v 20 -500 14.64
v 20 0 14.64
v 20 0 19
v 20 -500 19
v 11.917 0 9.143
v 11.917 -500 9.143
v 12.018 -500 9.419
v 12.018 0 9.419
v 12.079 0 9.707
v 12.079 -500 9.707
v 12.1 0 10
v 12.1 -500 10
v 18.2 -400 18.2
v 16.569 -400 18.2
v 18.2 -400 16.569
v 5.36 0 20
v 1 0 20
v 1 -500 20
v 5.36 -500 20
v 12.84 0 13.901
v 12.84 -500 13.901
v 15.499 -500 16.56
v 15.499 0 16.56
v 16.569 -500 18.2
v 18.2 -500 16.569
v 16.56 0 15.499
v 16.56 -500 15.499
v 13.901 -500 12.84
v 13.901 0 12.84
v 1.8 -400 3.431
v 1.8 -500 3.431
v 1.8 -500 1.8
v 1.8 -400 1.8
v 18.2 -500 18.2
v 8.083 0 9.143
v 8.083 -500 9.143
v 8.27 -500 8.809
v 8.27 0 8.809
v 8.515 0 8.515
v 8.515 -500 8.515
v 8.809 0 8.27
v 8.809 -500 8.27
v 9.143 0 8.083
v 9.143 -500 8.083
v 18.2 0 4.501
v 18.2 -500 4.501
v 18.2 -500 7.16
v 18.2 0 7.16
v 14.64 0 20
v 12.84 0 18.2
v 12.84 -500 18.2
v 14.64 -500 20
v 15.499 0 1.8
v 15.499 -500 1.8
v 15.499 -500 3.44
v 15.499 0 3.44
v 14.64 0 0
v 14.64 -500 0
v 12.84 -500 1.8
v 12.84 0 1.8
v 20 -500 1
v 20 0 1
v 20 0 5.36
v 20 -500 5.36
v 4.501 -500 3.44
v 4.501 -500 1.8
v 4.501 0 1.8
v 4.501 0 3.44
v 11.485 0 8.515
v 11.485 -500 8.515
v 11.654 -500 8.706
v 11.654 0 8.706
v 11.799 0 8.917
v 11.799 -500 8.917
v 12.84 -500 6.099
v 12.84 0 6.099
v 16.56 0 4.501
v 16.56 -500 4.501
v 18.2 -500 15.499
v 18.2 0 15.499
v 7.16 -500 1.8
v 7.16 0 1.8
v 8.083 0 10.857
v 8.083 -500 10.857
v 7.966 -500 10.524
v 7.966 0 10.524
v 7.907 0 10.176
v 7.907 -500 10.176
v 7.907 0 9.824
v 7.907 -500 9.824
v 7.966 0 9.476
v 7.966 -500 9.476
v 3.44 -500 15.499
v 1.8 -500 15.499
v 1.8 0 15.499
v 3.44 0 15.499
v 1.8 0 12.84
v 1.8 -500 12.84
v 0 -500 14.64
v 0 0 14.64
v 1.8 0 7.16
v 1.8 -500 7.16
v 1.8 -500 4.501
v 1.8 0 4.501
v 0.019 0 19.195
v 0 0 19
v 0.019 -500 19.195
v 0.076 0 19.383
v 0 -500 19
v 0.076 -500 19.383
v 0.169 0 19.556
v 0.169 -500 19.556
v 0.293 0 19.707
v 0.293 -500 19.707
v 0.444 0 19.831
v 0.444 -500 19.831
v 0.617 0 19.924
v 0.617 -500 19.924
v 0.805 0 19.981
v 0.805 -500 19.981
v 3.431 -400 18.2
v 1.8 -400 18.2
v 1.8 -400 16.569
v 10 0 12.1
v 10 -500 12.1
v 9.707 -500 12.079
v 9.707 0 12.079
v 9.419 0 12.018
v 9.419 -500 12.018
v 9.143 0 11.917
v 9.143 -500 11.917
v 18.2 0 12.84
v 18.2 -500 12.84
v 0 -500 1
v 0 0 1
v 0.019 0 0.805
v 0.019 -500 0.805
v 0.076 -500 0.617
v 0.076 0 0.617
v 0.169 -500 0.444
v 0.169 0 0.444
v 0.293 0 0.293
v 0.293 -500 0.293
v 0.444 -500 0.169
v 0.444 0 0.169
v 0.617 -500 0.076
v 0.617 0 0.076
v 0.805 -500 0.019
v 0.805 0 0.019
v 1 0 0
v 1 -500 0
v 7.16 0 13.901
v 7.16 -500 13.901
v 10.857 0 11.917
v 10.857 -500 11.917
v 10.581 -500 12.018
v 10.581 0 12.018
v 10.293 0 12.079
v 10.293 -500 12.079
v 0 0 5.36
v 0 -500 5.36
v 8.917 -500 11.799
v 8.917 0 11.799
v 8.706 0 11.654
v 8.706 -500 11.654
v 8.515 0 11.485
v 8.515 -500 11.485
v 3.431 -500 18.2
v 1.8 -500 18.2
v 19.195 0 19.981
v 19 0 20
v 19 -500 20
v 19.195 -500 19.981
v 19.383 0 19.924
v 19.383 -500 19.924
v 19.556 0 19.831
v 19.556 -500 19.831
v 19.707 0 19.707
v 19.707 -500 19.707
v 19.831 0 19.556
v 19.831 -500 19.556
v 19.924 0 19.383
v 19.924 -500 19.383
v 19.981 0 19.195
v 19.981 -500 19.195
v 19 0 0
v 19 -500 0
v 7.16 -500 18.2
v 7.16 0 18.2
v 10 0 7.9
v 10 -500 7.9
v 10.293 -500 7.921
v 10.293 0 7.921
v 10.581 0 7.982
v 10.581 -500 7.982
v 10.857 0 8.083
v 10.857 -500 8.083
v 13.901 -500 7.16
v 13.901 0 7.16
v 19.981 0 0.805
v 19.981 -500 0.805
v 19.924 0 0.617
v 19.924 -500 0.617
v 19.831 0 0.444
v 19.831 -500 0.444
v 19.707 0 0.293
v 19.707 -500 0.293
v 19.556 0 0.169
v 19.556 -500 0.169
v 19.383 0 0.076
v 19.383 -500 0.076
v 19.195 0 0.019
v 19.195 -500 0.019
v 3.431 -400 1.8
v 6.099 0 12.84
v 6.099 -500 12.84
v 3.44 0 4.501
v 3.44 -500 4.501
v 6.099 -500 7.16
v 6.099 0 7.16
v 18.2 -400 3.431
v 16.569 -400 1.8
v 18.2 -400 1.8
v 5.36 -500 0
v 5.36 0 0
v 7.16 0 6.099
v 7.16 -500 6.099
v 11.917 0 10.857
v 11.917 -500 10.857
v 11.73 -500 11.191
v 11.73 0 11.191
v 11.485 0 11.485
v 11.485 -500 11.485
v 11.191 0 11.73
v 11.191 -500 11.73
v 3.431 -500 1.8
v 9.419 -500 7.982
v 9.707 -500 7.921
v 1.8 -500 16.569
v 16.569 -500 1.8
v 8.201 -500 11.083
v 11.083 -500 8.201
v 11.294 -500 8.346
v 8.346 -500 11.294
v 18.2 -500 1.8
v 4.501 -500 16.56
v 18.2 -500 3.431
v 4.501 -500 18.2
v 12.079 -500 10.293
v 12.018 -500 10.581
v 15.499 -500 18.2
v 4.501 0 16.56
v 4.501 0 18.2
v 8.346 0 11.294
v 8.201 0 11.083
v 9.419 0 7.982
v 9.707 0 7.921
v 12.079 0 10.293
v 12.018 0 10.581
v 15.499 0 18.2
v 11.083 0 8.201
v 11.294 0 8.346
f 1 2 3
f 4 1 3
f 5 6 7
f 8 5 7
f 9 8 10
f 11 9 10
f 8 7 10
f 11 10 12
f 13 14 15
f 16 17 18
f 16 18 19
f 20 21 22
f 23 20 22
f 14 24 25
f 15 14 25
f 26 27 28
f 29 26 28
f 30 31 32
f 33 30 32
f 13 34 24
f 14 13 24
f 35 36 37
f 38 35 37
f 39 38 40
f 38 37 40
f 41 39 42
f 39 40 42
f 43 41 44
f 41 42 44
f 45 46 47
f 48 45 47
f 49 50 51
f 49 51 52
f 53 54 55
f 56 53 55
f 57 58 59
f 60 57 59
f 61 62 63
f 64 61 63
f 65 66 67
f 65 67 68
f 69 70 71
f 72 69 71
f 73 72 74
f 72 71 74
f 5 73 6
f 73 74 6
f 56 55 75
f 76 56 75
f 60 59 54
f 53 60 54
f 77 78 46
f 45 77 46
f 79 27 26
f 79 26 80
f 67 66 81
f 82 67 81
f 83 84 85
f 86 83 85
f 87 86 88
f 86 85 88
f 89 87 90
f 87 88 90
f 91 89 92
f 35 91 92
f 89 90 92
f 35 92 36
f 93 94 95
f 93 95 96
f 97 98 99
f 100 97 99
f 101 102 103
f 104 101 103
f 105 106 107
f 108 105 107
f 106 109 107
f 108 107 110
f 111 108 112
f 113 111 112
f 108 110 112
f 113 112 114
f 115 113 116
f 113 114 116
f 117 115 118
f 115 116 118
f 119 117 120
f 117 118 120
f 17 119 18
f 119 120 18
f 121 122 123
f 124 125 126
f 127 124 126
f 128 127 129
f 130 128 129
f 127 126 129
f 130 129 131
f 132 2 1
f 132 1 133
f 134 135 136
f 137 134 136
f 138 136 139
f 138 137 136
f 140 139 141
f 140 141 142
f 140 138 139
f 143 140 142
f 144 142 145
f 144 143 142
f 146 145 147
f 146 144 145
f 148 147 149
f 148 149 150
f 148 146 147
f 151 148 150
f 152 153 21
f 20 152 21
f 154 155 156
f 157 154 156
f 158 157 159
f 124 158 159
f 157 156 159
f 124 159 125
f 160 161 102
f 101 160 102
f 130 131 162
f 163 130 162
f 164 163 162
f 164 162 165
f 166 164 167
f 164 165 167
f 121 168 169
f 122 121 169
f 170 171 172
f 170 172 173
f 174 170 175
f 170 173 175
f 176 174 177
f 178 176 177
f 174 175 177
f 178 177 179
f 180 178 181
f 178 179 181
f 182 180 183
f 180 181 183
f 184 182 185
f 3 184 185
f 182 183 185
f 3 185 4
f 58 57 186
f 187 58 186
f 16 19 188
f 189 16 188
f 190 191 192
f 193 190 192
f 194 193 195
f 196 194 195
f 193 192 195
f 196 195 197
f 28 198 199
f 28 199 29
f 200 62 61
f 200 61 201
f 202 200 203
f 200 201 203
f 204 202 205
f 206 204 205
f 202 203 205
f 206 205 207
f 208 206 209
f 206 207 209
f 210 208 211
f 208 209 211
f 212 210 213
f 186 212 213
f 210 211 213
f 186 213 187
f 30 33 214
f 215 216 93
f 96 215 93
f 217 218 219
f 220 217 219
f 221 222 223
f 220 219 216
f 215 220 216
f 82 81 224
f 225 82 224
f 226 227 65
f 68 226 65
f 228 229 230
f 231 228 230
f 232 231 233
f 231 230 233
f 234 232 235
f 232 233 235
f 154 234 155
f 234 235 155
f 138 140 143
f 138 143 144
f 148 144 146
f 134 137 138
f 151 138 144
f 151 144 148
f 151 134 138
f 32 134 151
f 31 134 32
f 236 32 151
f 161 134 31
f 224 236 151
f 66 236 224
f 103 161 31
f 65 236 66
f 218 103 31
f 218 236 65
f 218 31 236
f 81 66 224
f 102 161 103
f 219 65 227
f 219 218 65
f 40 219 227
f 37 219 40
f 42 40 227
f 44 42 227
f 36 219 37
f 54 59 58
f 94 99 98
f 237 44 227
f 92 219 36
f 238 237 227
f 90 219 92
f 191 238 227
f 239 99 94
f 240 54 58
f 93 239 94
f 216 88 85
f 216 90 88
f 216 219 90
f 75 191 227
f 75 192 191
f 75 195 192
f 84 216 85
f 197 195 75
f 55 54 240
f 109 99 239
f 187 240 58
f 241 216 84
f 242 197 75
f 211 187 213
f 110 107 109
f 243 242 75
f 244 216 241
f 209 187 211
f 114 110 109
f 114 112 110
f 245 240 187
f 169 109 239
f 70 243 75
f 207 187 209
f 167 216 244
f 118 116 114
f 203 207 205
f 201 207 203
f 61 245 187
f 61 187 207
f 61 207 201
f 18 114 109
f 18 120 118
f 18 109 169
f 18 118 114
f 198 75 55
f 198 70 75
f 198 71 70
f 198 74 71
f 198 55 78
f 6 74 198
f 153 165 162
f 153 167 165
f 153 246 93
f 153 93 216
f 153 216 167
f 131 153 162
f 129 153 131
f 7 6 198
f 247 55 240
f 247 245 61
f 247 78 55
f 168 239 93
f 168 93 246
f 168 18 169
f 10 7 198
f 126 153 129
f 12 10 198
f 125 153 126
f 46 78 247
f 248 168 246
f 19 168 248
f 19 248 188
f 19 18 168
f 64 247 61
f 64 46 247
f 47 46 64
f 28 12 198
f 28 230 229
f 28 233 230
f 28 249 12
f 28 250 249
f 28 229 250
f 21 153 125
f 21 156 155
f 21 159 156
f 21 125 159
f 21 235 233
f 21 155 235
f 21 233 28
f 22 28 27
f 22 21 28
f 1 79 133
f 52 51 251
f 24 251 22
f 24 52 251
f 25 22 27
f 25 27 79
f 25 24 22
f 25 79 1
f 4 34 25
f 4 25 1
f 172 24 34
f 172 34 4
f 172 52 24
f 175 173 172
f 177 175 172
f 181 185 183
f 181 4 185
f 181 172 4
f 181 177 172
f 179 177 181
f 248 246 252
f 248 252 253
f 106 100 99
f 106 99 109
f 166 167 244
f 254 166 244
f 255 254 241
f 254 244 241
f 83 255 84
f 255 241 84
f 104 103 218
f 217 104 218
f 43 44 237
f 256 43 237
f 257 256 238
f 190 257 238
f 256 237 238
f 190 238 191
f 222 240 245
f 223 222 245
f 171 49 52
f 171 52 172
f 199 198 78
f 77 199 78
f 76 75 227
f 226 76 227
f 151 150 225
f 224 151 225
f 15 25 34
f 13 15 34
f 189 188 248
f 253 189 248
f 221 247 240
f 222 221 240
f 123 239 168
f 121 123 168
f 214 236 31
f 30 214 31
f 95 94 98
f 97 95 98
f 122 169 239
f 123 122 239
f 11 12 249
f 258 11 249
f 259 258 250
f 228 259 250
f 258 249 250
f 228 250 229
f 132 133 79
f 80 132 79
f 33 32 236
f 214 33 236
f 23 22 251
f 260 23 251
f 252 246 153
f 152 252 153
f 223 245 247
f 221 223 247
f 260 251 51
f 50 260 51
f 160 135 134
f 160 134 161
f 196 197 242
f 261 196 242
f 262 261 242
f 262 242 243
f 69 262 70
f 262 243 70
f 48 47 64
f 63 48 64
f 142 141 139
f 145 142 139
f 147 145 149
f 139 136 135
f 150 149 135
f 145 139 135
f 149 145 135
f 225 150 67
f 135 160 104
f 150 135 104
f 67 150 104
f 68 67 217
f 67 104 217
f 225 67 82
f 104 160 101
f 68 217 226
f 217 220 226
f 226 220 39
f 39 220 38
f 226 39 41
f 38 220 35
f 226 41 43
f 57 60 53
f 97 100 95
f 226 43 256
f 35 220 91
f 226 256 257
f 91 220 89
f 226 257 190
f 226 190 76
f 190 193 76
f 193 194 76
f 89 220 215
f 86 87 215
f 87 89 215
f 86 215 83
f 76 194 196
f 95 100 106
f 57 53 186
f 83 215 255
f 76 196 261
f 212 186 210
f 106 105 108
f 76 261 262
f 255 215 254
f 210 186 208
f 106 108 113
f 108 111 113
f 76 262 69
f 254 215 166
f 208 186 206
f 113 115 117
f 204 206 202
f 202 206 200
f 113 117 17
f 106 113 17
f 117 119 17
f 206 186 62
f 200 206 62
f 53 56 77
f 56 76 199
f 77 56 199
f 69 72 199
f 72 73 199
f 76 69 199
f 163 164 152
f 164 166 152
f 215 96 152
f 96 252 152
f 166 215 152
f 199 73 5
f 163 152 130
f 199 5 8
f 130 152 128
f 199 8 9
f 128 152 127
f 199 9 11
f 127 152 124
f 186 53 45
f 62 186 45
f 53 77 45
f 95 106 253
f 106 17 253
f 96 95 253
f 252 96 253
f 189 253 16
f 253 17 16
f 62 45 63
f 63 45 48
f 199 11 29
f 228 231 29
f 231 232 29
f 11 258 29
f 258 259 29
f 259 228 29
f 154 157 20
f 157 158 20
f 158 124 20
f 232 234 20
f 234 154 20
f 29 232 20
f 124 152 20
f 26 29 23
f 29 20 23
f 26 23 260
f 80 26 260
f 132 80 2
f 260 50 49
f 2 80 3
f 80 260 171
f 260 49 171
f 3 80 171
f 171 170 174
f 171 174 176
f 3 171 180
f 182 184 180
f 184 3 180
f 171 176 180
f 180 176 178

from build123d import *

# Parameters (mm, degrees)
F0_W     = 20
F0_H     = 20
F1_DEPTH = 500
F2_W     = 2.6593398282
F2_H     = 5.68
F2_W_2   = 2.84
F2_H_2   = 2.6593398282
F2_W_3   = 1.64
F2_H_3   = 1.64
F2_H_4   = 1.8
F3_DEPTH = 1000
F5_DEPTH = 100
F6_R     = 1


with BuildPart() as f1:
    # F0 (on Front) → F1 (new body)
    with BuildSketch(Plane.XZ):
        with Locations((10, 10)):
            Rectangle(F0_W, F0_H)
    extrude(amount=F1_DEPTH)

    # F2 (on face) → F3 (cut)
    with BuildSketch(Plane.XZ.offset(500)):
        with BuildLine():
            ThreePointArc((11.9173232366, 9.1433369352), (12.0538231176, 9.5620381277), (12.1, 10))
            ThreePointArc((12.1, 10), (12.0538231176, 10.4379618723), (11.9173232366, 10.8566630648))
            Line((11.9173232366, 10.8566630648), (11.0606601718, 10))
            Line((11.0606601718, 10), (11.9173232366, 9.1433369352))
        make_face()
        with BuildLine():
            Line((11.0606601718, 10), (11.9173232366, 10.8566630648))
            ThreePointArc((11.9173232366, 10.8566630648), (11.4849242405, 11.4849242405), (10.8566630648, 11.9173232366))
            Line((10.8566630648, 11.9173232366), (10, 11.0606601718))
            Line((10, 11.0606601718), (11.0606601718, 10))
        make_face()
        with BuildLine():
            ThreePointArc((11.4849242405, 8.5150757595), (11.7298843892, 8.80941191), (11.9173232366, 9.1433369352))
            Line((11.9173232366, 9.1433369352), (11.0606601718, 10))
            Line((11.0606601718, 10), (10.5303300859, 9.4696699141))
            Line((10.5303300859, 9.4696699141), (11.4849242405, 8.5150757595))
        make_face()
        with BuildLine():
            Line((10, 11.0606601718), (10.8566630648, 11.9173232366))
            ThreePointArc((10.8566630648, 11.9173232366), (10.4379618723, 12.0538231176), (10, 12.1))
            Line((10, 12.1), (10, 11.0606601718))
        make_face()
        Polygon((16.56, 15.4993398282), (13.9006601718, 12.84), (16.56, 12.84), align=None)
        with Locations((15.2303300859, 10)):
            Rectangle(F2_W, F2_H)
        Polygon((10.5303300859, 9.4696699141), (11.0606601718, 10), (10, 11.0606601718), (10, 10), align=None)
        with BuildLine():
            ThreePointArc((10.8566630648, 8.0826767634), (11.19058809, 8.2701156108), (11.4849242405, 8.5150757595))
            Line((11.4849242405, 8.5150757595), (10.5303300859, 9.4696699141))
            Line((10.5303300859, 9.4696699141), (10, 8.9393398282))
            Line((10, 8.9393398282), (10.8566630648, 8.0826767634))
        make_face()
        Polygon((16.56, 7.16), (13.9006601718, 7.16), (16.56, 4.5006601718), align=None)
        with BuildLine():
            Line((10, 11.0606601718), (10, 12.1))
            ThreePointArc((10, 12.1), (9.5620381277, 12.0538231176), (9.1433369352, 11.9173232366))
            Line((9.1433369352, 11.9173232366), (10, 11.0606601718))
        make_face()
        with BuildLine():
            Line((9.4696699141, 10.5303300859), (10, 11.0606601718))
            Line((10, 11.0606601718), (9.1433369352, 11.9173232366))
            ThreePointArc((9.1433369352, 11.9173232366), (8.80941191, 11.7298843892), (8.5150757595, 11.4849242405))
            Line((8.5150757595, 11.4849242405), (9.4696699141, 10.5303300859))
        make_face()
        Polygon((10, 10), (10, 11.0606601718), (9.4696699141, 10.5303300859), align=None)
        Polygon((12.84, 16.56), (12.84, 13.9006601718), (15.4993398282, 16.56), align=None)
        with Locations((11.42, 15.2303300859)):
            Rectangle(F2_W_2, F2_H_2)
        with Locations((17.38, 14.1696699141)):
            Rectangle(F2_W_3, F2_H_2)
        with Locations((17.38, 10)):
            Rectangle(F2_W_3, F2_H)
        Polygon((10, 8.9393398282), (10.5303300859, 9.4696699141), (10, 10), align=None)
        with BuildLine():
            ThreePointArc((10, 7.9), (10.4379618723, 7.9461768824), (10.8566630648, 8.0826767634))
            Line((10.8566630648, 8.0826767634), (10, 8.9393398282))
            Line((10, 8.9393398282), (10, 7.9))
        make_face()
        with Locations((17.38, 5.8303300859)):
            Rectangle(F2_W_3, F2_H_2)
        with Locations((8.58, 15.2303300859)):
            Rectangle(F2_W_2, F2_H_2)
        Polygon((10, 10), (9.4696699141, 10.5303300859), (8.9393398282, 10), (10, 8.9393398282), align=None)
        with BuildLine():
            Line((8.9393398282, 10), (9.4696699141, 10.5303300859))
            Line((9.4696699141, 10.5303300859), (8.5150757595, 11.4849242405))
            ThreePointArc((8.5150757595, 11.4849242405), (8.2701156108, 11.19058809), (8.0826767634, 10.8566630648))
            Line((8.0826767634, 10.8566630648), (8.9393398282, 10))
        make_face()
        with Locations((14.1696699141, 17.38)):
            Rectangle(F2_W, F2_H_3)
        with Locations((11.42, 17.38)):
            Rectangle(F2_W_2, F2_H_3)
        Polygon((20, 12.84), (18.2, 12.84), (18.2, 7.16), (20, 7.16), (20, 10), align=None)
        Polygon((20, 14.64), (18.2, 12.84), (20, 12.84), align=None)
        with BuildLine():
            Line((9.1433369352, 8.0826767634), (10, 8.9393398282))
            Line((10, 8.9393398282), (8.9393398282, 10))
            Line((8.9393398282, 10), (8.0826767634, 9.1433369352))
            ThreePointArc((8.0826767634, 9.1433369352), (8.5150757595, 8.5150757595), (9.1433369352, 8.0826767634))
        make_face()
        with BuildLine():
            Line((10, 7.9), (10, 8.9393398282))
            Line((10, 8.9393398282), (9.1433369352, 8.0826767634))
            ThreePointArc((9.1433369352, 8.0826767634), (9.5620381277, 7.9461768824), (10, 7.9))
        make_face()
        Polygon((15.4993398282, 3.44), (12.84, 6.0993398282), (12.84, 3.44), align=None)
        with Locations((11.42, 4.7696699141)):
            Rectangle(F2_W_2, F2_H_2)
        Polygon((20, 7.16), (18.2, 7.16), (20, 5.36), align=None)
        Polygon((4.5006601718, 16.56), (7.16, 13.9006601718), (7.16, 16.56), align=None)
        with Locations((8.58, 17.38)):
            Rectangle(F2_W_2, F2_H_3)
        with BuildLine():
            Line((8.0826767634, 9.1433369352), (8.9393398282, 10))
            Line((8.9393398282, 10), (8.0826767634, 10.8566630648))
            ThreePointArc((8.0826767634, 10.8566630648), (7.9, 10), (8.0826767634, 9.1433369352))
        make_face()
        Polygon((12.84, 20), (12.84, 18.2), (14.64, 20), align=None)
        with Locations((11.42, 19.1)):
            Rectangle(F2_W_2, F2_H_4)
        with Locations((8.58, 4.7696699141)):
            Rectangle(F2_W_2, F2_H_2)
        with Locations((14.1696699141, 2.62)):
            Rectangle(F2_W, F2_H_3)
        with Locations((11.42, 2.62)):
            Rectangle(F2_W_2, F2_H_3)
        with Locations((5.8303300859, 17.38)):
            Rectangle(F2_W, F2_H_3)
        with Locations((8.58, 19.1)):
            Rectangle(F2_W_2, F2_H_4)
        Polygon((7.16, 3.44), (7.16, 6.0993398282), (4.5006601718, 3.44), align=None)
        with Locations((8.58, 2.62)):
            Rectangle(F2_W_2, F2_H_3)
        with Locations((11.42, 0.9)):
            Rectangle(F2_W_2, F2_H_4)
        Polygon((14.64, 0), (12.84, 1.8), (12.84, 0), align=None)
        Polygon((3.44, 12.84), (6.0993398282, 12.84), (3.44, 15.4993398282), align=None)
        with Locations((4.7696699141, 10)):
            Rectangle(F2_W, F2_H)
        Polygon((5.36, 20), (7.16, 18.2), (7.16, 20), align=None)
        Polygon((3.44, 4.5006601718), (6.0993398282, 7.16), (3.44, 7.16), align=None)
        with Locations((5.8303300859, 2.62)):
            Rectangle(F2_W, F2_H_3)
        with Locations((8.58, 0.9)):
            Rectangle(F2_W_2, F2_H_4)
        with Locations((2.62, 14.1696699141)):
            Rectangle(F2_W_3, F2_H_2)
        with Locations((2.62, 10)):
            Rectangle(F2_W_3, F2_H)
        with Locations((2.62, 5.8303300859)):
            Rectangle(F2_W_3, F2_H_2)
        Polygon((7.16, 0), (7.16, 1.8), (5.36, 0), align=None)
        Polygon((0, 12.84), (1.8, 12.84), (0, 14.64), align=None)
        Polygon((1.8, 7.16), (1.8, 12.84), (0, 12.84), (0, 10), (0, 7.16), align=None)
        Polygon((0, 5.36), (1.8, 7.16), (0, 7.16), align=None)
    extrude(amount=-F3_DEPTH, mode=Mode.SUBTRACT)

    # F4 (on face) → F5 (cut)
    with BuildSketch(Plane.XZ.offset(500)):
        Polygon((3.4306601718, 1.8), (1.8, 3.4306601718), (1.8, 1.8), align=None)
        Polygon((1.8, 18.2), (1.8, 16.5693398282), (3.4306601718, 18.2), align=None)
        Polygon((18.2, 18.2), (16.5693398282, 18.2), (18.2, 16.5693398282), align=None)
        Polygon((18.2, 3.4306601718), (16.5693398282, 1.8), (18.2, 1.8), align=None)
    extrude(amount=-F5_DEPTH, mode=Mode.SUBTRACT)

    # F6
    f6_edges = [f1.edges().sort_by_distance(p)[0] for p in [
        (20, -250, 20),
        (20, -250, 0),
        (0, -250, 20),
        (0, -250, 0),
    ]]
    fillet(f6_edges, radius=F6_R)


solid = f1.part
